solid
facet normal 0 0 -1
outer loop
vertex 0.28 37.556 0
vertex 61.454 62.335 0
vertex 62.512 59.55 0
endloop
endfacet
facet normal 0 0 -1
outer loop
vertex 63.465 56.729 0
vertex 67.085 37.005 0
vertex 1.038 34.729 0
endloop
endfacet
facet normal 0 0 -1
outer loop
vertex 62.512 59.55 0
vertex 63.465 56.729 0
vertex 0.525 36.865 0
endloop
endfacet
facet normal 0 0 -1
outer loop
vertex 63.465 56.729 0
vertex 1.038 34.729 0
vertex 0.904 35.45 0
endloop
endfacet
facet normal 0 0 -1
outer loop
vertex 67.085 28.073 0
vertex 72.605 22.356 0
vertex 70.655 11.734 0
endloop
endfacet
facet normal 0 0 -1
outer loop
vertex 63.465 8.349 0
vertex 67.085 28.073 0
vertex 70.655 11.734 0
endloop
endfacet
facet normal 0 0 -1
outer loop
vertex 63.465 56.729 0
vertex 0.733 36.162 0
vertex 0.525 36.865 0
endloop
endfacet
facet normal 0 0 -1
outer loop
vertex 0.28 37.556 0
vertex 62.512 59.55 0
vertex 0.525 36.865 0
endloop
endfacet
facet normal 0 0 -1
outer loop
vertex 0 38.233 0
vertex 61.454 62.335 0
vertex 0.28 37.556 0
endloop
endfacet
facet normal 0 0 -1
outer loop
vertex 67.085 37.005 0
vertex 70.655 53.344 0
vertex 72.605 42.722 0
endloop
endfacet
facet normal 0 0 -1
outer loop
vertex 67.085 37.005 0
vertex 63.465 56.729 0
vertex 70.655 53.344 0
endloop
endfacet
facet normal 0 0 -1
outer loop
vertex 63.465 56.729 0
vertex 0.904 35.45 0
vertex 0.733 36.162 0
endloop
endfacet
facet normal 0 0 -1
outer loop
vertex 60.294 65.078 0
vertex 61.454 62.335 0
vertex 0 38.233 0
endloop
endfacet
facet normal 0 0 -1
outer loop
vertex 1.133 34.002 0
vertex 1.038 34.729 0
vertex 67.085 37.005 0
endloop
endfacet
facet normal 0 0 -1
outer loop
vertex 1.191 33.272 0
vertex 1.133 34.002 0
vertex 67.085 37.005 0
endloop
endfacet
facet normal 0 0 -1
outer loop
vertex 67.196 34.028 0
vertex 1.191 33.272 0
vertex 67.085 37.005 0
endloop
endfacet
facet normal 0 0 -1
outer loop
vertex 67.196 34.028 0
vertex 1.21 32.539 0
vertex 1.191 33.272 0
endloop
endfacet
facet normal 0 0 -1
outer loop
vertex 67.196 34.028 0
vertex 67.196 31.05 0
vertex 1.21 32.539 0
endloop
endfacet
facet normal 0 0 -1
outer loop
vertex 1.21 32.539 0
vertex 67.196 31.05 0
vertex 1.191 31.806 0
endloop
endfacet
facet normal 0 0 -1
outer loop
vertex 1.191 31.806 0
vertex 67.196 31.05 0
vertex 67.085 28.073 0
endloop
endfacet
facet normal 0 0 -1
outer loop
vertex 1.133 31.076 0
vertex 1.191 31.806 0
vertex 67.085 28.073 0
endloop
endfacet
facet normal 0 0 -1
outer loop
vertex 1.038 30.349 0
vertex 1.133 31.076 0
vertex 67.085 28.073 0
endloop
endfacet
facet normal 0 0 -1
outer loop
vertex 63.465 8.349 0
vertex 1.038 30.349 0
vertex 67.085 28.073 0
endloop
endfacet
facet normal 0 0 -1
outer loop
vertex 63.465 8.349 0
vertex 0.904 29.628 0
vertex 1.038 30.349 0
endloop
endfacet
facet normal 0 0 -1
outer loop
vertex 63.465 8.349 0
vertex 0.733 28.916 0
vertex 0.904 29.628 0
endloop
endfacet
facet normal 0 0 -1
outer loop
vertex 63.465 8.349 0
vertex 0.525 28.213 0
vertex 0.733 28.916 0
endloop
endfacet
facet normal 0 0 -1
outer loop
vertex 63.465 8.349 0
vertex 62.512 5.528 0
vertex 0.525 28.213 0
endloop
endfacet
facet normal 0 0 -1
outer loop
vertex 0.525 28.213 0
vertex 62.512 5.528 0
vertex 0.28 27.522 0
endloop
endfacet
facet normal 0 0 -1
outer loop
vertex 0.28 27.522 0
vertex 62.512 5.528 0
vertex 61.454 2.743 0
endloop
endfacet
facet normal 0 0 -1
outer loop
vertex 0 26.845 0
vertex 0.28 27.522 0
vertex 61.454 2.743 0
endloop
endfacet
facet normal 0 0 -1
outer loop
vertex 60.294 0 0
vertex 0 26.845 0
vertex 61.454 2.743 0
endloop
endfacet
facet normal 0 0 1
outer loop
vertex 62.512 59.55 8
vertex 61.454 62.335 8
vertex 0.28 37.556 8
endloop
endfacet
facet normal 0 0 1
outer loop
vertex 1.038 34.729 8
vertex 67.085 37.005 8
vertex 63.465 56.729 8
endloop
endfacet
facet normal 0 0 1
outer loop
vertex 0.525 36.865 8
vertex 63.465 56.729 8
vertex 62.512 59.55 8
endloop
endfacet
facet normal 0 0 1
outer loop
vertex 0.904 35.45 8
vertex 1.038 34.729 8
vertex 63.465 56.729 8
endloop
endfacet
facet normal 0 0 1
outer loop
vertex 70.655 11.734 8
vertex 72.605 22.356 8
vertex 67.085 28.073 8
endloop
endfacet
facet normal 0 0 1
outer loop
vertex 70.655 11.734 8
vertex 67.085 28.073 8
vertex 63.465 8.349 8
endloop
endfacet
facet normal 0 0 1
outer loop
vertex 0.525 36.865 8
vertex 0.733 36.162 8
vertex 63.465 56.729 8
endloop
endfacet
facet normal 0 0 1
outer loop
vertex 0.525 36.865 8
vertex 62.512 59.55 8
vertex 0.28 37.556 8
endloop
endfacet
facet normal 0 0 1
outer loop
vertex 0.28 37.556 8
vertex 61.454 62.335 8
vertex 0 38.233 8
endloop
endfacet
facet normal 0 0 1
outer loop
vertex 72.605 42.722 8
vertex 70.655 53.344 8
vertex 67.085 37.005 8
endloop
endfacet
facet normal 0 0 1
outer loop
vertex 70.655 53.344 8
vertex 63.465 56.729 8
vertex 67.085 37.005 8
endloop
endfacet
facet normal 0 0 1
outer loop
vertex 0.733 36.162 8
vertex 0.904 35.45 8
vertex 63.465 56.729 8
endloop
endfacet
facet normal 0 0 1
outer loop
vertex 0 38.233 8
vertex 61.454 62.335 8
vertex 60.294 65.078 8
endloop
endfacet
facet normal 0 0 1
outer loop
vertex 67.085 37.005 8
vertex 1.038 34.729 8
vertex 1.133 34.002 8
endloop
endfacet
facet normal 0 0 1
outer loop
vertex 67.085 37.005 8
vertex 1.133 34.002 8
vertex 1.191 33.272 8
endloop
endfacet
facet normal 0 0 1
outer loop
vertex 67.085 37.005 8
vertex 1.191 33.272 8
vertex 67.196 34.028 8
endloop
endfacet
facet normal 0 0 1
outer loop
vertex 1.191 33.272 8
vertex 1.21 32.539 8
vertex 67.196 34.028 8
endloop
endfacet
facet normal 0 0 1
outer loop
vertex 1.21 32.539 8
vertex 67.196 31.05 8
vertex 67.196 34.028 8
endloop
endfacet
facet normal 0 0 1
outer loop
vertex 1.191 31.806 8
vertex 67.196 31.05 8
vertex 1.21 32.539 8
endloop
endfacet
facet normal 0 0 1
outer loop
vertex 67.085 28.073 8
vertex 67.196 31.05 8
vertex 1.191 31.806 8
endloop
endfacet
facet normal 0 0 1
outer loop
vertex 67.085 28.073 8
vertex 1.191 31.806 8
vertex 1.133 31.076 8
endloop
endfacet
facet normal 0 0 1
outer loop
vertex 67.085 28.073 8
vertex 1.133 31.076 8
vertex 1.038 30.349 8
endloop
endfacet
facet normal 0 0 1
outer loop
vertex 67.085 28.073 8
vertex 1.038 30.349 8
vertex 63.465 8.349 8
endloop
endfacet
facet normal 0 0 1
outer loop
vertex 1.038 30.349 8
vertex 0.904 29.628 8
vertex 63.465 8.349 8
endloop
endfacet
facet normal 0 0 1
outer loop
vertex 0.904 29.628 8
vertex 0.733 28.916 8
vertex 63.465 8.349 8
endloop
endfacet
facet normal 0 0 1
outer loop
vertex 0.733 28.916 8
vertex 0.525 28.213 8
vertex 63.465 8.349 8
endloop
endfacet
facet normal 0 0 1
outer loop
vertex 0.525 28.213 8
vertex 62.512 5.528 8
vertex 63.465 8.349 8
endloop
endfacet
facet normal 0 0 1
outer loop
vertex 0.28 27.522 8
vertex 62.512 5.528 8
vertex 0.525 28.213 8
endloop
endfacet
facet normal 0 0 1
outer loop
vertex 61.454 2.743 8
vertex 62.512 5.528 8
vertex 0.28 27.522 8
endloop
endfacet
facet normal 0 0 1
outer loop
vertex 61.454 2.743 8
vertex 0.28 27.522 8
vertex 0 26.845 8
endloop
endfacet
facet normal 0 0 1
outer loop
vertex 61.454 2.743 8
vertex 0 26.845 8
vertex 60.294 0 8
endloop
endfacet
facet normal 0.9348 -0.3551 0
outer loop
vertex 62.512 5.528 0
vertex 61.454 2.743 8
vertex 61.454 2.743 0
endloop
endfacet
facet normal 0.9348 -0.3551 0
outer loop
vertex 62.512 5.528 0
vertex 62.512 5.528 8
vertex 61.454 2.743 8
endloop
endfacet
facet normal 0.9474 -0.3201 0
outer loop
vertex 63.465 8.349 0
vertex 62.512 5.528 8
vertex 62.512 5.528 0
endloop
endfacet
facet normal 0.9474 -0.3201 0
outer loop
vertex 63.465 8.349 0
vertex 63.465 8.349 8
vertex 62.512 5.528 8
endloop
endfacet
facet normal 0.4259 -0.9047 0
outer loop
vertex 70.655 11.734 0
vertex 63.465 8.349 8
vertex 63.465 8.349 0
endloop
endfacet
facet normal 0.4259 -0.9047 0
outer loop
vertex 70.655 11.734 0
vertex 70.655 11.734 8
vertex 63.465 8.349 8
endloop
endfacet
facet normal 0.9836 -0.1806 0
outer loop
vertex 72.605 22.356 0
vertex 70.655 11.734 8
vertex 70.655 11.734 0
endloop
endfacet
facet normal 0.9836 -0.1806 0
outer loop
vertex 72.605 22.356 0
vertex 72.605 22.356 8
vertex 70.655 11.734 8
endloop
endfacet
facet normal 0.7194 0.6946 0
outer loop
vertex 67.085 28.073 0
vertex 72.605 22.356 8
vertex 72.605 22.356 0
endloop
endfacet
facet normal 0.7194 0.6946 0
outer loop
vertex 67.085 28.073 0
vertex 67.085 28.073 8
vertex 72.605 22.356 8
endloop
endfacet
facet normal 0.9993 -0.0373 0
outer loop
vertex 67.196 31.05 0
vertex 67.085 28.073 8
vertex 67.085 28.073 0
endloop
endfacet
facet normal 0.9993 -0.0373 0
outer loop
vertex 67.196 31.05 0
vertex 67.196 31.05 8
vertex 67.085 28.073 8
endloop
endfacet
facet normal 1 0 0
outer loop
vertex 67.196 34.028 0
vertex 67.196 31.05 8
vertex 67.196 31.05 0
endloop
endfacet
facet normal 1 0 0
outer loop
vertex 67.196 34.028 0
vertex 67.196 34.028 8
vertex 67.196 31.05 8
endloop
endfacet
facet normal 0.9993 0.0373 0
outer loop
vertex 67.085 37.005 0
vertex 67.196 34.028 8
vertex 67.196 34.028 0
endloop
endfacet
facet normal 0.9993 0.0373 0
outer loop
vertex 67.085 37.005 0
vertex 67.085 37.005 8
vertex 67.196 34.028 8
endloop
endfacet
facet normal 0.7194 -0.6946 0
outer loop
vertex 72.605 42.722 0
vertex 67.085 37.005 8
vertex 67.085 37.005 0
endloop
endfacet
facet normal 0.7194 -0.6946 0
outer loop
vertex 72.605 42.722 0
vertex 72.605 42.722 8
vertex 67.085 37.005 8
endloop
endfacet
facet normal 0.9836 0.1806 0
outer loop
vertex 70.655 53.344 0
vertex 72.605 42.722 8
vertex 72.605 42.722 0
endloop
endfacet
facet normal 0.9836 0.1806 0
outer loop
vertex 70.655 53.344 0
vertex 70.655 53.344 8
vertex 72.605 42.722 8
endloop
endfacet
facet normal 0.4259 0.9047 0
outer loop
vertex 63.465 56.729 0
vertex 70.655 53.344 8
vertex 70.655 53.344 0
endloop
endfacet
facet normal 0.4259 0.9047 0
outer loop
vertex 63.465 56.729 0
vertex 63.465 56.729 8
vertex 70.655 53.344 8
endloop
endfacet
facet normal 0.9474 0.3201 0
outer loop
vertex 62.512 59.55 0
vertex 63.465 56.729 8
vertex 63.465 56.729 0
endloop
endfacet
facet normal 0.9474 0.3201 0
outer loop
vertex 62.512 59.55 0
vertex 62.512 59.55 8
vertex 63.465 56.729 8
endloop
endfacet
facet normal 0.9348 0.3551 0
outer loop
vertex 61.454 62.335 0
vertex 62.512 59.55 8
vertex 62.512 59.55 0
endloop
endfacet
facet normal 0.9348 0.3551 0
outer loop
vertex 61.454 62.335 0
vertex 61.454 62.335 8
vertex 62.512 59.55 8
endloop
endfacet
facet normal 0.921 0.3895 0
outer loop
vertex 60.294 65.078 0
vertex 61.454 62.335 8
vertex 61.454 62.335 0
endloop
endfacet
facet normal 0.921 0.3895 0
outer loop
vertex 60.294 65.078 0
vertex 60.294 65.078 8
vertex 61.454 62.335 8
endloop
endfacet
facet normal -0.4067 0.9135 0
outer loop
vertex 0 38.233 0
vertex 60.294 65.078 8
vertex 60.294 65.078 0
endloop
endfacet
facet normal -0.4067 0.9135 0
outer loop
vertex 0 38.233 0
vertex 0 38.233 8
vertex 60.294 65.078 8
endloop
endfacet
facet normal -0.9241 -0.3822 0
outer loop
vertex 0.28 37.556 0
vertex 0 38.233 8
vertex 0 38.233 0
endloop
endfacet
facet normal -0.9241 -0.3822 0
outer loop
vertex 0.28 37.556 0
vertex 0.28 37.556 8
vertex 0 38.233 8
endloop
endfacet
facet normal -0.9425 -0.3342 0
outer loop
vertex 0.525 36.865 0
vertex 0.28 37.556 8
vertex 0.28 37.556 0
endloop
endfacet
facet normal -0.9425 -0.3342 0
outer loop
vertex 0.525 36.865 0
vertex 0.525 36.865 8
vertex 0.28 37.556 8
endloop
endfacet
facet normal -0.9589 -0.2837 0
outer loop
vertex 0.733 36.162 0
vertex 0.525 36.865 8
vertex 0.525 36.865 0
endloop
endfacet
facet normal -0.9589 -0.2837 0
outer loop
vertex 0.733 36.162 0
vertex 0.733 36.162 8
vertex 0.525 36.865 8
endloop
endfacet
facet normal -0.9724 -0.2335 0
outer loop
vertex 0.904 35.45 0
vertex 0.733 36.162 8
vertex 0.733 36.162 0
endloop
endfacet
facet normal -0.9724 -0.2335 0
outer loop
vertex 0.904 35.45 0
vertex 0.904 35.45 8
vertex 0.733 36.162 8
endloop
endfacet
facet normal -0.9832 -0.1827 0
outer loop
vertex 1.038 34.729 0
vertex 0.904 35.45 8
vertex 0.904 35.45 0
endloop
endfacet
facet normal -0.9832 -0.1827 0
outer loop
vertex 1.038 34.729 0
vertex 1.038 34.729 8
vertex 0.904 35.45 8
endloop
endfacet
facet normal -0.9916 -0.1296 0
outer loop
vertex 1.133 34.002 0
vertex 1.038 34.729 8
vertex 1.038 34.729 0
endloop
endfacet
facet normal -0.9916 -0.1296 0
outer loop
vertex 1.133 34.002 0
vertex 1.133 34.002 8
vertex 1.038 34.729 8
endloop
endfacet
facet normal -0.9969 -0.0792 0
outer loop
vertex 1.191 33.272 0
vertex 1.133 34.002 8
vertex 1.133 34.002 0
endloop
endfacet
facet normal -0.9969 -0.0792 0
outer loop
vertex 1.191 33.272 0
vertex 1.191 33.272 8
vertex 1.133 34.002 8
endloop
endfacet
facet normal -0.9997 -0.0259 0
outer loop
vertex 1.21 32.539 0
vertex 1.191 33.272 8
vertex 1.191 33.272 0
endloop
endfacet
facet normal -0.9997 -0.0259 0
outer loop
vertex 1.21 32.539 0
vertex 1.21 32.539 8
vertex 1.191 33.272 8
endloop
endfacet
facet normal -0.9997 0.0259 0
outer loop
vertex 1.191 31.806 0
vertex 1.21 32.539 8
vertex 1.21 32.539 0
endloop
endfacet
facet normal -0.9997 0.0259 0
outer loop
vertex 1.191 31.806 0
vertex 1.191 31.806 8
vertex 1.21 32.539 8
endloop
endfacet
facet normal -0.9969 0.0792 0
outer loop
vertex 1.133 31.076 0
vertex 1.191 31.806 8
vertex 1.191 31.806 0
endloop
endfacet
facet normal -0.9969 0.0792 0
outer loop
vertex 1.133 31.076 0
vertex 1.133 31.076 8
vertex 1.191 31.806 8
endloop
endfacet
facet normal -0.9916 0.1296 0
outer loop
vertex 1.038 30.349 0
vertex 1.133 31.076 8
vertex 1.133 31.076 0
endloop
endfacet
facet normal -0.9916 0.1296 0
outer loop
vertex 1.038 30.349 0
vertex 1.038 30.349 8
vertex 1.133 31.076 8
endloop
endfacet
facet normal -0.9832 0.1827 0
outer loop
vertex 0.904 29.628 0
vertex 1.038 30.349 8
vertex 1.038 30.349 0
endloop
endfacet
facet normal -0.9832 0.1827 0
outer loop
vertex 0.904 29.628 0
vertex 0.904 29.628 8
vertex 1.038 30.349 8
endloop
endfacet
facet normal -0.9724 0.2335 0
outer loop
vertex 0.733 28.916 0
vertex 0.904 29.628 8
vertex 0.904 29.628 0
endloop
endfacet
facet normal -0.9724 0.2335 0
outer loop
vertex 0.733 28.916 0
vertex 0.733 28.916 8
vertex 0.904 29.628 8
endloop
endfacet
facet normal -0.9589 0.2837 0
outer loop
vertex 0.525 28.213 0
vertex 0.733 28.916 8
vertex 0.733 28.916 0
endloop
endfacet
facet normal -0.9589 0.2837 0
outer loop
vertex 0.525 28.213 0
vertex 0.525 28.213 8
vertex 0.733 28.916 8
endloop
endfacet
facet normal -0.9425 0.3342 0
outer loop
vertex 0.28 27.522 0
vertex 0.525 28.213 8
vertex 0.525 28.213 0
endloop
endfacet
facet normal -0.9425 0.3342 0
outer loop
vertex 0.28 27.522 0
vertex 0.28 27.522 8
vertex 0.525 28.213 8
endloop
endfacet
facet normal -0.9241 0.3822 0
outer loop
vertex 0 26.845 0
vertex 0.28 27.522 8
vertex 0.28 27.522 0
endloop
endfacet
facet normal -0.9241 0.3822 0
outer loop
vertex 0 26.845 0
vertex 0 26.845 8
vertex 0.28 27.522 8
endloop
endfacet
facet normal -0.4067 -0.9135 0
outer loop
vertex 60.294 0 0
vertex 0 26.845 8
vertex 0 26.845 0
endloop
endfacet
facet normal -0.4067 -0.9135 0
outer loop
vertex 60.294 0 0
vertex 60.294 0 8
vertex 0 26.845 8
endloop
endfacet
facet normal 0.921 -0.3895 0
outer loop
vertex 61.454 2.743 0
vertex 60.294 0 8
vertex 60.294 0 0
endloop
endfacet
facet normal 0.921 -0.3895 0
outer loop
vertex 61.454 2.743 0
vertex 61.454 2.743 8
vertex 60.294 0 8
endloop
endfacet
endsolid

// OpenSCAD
$fn = 32;

// ----------------------------------------------------------------------
// Gear sector: 2 teeth on 48 degrees
// ----------------------------------------------------------------------

// --- parameters (mm) ---
sector_angle = 48;        // sector angle, degrees
root_r = 80;              // root circle radius
tooth_h = 6;              // tooth height over the root circle
teeth = 2;                // number of teeth on the sector
hub_r = 14;               // hub bore radius
plate_t = 8;              // sector thickness, Z
arc_step = 3;             // sampling step of the root/hub arcs, degrees
fit_tol = 0.1;            // declared fit tolerance (prompt contract)
free_tol = 0.3;           // declared free tolerance (prompt contract)

tip_r = root_r + tooth_h;  // tip circle radius

profile = [[60.294, 0], [61.454, 2.743], [62.512, 5.528], [63.465, 8.349], [70.655, 11.734], [72.605, 22.356], [67.085, 28.073], [67.196, 31.05], [67.196, 34.028], [67.085, 37.005], [72.605, 42.722], [70.655, 53.344], [63.465, 56.729], [62.512, 59.55], [61.454, 62.335], [60.294, 65.078], [0, 38.233], [0.28, 37.556], [0.525, 36.865], [0.733, 36.162], [0.904, 35.45], [1.038, 34.729], [1.133, 34.002], [1.191, 33.272], [1.21, 32.539], [1.191, 31.806], [1.133, 31.076], [1.038, 30.349], [0.904, 29.628], [0.733, 28.916], [0.525, 28.213], [0.28, 27.522], [0, 26.845]];  // primary outline, 33 points, counter clockwise

// --- the one profile operation ---
linear_extrude(height = plate_t) polygon(points = profile);
